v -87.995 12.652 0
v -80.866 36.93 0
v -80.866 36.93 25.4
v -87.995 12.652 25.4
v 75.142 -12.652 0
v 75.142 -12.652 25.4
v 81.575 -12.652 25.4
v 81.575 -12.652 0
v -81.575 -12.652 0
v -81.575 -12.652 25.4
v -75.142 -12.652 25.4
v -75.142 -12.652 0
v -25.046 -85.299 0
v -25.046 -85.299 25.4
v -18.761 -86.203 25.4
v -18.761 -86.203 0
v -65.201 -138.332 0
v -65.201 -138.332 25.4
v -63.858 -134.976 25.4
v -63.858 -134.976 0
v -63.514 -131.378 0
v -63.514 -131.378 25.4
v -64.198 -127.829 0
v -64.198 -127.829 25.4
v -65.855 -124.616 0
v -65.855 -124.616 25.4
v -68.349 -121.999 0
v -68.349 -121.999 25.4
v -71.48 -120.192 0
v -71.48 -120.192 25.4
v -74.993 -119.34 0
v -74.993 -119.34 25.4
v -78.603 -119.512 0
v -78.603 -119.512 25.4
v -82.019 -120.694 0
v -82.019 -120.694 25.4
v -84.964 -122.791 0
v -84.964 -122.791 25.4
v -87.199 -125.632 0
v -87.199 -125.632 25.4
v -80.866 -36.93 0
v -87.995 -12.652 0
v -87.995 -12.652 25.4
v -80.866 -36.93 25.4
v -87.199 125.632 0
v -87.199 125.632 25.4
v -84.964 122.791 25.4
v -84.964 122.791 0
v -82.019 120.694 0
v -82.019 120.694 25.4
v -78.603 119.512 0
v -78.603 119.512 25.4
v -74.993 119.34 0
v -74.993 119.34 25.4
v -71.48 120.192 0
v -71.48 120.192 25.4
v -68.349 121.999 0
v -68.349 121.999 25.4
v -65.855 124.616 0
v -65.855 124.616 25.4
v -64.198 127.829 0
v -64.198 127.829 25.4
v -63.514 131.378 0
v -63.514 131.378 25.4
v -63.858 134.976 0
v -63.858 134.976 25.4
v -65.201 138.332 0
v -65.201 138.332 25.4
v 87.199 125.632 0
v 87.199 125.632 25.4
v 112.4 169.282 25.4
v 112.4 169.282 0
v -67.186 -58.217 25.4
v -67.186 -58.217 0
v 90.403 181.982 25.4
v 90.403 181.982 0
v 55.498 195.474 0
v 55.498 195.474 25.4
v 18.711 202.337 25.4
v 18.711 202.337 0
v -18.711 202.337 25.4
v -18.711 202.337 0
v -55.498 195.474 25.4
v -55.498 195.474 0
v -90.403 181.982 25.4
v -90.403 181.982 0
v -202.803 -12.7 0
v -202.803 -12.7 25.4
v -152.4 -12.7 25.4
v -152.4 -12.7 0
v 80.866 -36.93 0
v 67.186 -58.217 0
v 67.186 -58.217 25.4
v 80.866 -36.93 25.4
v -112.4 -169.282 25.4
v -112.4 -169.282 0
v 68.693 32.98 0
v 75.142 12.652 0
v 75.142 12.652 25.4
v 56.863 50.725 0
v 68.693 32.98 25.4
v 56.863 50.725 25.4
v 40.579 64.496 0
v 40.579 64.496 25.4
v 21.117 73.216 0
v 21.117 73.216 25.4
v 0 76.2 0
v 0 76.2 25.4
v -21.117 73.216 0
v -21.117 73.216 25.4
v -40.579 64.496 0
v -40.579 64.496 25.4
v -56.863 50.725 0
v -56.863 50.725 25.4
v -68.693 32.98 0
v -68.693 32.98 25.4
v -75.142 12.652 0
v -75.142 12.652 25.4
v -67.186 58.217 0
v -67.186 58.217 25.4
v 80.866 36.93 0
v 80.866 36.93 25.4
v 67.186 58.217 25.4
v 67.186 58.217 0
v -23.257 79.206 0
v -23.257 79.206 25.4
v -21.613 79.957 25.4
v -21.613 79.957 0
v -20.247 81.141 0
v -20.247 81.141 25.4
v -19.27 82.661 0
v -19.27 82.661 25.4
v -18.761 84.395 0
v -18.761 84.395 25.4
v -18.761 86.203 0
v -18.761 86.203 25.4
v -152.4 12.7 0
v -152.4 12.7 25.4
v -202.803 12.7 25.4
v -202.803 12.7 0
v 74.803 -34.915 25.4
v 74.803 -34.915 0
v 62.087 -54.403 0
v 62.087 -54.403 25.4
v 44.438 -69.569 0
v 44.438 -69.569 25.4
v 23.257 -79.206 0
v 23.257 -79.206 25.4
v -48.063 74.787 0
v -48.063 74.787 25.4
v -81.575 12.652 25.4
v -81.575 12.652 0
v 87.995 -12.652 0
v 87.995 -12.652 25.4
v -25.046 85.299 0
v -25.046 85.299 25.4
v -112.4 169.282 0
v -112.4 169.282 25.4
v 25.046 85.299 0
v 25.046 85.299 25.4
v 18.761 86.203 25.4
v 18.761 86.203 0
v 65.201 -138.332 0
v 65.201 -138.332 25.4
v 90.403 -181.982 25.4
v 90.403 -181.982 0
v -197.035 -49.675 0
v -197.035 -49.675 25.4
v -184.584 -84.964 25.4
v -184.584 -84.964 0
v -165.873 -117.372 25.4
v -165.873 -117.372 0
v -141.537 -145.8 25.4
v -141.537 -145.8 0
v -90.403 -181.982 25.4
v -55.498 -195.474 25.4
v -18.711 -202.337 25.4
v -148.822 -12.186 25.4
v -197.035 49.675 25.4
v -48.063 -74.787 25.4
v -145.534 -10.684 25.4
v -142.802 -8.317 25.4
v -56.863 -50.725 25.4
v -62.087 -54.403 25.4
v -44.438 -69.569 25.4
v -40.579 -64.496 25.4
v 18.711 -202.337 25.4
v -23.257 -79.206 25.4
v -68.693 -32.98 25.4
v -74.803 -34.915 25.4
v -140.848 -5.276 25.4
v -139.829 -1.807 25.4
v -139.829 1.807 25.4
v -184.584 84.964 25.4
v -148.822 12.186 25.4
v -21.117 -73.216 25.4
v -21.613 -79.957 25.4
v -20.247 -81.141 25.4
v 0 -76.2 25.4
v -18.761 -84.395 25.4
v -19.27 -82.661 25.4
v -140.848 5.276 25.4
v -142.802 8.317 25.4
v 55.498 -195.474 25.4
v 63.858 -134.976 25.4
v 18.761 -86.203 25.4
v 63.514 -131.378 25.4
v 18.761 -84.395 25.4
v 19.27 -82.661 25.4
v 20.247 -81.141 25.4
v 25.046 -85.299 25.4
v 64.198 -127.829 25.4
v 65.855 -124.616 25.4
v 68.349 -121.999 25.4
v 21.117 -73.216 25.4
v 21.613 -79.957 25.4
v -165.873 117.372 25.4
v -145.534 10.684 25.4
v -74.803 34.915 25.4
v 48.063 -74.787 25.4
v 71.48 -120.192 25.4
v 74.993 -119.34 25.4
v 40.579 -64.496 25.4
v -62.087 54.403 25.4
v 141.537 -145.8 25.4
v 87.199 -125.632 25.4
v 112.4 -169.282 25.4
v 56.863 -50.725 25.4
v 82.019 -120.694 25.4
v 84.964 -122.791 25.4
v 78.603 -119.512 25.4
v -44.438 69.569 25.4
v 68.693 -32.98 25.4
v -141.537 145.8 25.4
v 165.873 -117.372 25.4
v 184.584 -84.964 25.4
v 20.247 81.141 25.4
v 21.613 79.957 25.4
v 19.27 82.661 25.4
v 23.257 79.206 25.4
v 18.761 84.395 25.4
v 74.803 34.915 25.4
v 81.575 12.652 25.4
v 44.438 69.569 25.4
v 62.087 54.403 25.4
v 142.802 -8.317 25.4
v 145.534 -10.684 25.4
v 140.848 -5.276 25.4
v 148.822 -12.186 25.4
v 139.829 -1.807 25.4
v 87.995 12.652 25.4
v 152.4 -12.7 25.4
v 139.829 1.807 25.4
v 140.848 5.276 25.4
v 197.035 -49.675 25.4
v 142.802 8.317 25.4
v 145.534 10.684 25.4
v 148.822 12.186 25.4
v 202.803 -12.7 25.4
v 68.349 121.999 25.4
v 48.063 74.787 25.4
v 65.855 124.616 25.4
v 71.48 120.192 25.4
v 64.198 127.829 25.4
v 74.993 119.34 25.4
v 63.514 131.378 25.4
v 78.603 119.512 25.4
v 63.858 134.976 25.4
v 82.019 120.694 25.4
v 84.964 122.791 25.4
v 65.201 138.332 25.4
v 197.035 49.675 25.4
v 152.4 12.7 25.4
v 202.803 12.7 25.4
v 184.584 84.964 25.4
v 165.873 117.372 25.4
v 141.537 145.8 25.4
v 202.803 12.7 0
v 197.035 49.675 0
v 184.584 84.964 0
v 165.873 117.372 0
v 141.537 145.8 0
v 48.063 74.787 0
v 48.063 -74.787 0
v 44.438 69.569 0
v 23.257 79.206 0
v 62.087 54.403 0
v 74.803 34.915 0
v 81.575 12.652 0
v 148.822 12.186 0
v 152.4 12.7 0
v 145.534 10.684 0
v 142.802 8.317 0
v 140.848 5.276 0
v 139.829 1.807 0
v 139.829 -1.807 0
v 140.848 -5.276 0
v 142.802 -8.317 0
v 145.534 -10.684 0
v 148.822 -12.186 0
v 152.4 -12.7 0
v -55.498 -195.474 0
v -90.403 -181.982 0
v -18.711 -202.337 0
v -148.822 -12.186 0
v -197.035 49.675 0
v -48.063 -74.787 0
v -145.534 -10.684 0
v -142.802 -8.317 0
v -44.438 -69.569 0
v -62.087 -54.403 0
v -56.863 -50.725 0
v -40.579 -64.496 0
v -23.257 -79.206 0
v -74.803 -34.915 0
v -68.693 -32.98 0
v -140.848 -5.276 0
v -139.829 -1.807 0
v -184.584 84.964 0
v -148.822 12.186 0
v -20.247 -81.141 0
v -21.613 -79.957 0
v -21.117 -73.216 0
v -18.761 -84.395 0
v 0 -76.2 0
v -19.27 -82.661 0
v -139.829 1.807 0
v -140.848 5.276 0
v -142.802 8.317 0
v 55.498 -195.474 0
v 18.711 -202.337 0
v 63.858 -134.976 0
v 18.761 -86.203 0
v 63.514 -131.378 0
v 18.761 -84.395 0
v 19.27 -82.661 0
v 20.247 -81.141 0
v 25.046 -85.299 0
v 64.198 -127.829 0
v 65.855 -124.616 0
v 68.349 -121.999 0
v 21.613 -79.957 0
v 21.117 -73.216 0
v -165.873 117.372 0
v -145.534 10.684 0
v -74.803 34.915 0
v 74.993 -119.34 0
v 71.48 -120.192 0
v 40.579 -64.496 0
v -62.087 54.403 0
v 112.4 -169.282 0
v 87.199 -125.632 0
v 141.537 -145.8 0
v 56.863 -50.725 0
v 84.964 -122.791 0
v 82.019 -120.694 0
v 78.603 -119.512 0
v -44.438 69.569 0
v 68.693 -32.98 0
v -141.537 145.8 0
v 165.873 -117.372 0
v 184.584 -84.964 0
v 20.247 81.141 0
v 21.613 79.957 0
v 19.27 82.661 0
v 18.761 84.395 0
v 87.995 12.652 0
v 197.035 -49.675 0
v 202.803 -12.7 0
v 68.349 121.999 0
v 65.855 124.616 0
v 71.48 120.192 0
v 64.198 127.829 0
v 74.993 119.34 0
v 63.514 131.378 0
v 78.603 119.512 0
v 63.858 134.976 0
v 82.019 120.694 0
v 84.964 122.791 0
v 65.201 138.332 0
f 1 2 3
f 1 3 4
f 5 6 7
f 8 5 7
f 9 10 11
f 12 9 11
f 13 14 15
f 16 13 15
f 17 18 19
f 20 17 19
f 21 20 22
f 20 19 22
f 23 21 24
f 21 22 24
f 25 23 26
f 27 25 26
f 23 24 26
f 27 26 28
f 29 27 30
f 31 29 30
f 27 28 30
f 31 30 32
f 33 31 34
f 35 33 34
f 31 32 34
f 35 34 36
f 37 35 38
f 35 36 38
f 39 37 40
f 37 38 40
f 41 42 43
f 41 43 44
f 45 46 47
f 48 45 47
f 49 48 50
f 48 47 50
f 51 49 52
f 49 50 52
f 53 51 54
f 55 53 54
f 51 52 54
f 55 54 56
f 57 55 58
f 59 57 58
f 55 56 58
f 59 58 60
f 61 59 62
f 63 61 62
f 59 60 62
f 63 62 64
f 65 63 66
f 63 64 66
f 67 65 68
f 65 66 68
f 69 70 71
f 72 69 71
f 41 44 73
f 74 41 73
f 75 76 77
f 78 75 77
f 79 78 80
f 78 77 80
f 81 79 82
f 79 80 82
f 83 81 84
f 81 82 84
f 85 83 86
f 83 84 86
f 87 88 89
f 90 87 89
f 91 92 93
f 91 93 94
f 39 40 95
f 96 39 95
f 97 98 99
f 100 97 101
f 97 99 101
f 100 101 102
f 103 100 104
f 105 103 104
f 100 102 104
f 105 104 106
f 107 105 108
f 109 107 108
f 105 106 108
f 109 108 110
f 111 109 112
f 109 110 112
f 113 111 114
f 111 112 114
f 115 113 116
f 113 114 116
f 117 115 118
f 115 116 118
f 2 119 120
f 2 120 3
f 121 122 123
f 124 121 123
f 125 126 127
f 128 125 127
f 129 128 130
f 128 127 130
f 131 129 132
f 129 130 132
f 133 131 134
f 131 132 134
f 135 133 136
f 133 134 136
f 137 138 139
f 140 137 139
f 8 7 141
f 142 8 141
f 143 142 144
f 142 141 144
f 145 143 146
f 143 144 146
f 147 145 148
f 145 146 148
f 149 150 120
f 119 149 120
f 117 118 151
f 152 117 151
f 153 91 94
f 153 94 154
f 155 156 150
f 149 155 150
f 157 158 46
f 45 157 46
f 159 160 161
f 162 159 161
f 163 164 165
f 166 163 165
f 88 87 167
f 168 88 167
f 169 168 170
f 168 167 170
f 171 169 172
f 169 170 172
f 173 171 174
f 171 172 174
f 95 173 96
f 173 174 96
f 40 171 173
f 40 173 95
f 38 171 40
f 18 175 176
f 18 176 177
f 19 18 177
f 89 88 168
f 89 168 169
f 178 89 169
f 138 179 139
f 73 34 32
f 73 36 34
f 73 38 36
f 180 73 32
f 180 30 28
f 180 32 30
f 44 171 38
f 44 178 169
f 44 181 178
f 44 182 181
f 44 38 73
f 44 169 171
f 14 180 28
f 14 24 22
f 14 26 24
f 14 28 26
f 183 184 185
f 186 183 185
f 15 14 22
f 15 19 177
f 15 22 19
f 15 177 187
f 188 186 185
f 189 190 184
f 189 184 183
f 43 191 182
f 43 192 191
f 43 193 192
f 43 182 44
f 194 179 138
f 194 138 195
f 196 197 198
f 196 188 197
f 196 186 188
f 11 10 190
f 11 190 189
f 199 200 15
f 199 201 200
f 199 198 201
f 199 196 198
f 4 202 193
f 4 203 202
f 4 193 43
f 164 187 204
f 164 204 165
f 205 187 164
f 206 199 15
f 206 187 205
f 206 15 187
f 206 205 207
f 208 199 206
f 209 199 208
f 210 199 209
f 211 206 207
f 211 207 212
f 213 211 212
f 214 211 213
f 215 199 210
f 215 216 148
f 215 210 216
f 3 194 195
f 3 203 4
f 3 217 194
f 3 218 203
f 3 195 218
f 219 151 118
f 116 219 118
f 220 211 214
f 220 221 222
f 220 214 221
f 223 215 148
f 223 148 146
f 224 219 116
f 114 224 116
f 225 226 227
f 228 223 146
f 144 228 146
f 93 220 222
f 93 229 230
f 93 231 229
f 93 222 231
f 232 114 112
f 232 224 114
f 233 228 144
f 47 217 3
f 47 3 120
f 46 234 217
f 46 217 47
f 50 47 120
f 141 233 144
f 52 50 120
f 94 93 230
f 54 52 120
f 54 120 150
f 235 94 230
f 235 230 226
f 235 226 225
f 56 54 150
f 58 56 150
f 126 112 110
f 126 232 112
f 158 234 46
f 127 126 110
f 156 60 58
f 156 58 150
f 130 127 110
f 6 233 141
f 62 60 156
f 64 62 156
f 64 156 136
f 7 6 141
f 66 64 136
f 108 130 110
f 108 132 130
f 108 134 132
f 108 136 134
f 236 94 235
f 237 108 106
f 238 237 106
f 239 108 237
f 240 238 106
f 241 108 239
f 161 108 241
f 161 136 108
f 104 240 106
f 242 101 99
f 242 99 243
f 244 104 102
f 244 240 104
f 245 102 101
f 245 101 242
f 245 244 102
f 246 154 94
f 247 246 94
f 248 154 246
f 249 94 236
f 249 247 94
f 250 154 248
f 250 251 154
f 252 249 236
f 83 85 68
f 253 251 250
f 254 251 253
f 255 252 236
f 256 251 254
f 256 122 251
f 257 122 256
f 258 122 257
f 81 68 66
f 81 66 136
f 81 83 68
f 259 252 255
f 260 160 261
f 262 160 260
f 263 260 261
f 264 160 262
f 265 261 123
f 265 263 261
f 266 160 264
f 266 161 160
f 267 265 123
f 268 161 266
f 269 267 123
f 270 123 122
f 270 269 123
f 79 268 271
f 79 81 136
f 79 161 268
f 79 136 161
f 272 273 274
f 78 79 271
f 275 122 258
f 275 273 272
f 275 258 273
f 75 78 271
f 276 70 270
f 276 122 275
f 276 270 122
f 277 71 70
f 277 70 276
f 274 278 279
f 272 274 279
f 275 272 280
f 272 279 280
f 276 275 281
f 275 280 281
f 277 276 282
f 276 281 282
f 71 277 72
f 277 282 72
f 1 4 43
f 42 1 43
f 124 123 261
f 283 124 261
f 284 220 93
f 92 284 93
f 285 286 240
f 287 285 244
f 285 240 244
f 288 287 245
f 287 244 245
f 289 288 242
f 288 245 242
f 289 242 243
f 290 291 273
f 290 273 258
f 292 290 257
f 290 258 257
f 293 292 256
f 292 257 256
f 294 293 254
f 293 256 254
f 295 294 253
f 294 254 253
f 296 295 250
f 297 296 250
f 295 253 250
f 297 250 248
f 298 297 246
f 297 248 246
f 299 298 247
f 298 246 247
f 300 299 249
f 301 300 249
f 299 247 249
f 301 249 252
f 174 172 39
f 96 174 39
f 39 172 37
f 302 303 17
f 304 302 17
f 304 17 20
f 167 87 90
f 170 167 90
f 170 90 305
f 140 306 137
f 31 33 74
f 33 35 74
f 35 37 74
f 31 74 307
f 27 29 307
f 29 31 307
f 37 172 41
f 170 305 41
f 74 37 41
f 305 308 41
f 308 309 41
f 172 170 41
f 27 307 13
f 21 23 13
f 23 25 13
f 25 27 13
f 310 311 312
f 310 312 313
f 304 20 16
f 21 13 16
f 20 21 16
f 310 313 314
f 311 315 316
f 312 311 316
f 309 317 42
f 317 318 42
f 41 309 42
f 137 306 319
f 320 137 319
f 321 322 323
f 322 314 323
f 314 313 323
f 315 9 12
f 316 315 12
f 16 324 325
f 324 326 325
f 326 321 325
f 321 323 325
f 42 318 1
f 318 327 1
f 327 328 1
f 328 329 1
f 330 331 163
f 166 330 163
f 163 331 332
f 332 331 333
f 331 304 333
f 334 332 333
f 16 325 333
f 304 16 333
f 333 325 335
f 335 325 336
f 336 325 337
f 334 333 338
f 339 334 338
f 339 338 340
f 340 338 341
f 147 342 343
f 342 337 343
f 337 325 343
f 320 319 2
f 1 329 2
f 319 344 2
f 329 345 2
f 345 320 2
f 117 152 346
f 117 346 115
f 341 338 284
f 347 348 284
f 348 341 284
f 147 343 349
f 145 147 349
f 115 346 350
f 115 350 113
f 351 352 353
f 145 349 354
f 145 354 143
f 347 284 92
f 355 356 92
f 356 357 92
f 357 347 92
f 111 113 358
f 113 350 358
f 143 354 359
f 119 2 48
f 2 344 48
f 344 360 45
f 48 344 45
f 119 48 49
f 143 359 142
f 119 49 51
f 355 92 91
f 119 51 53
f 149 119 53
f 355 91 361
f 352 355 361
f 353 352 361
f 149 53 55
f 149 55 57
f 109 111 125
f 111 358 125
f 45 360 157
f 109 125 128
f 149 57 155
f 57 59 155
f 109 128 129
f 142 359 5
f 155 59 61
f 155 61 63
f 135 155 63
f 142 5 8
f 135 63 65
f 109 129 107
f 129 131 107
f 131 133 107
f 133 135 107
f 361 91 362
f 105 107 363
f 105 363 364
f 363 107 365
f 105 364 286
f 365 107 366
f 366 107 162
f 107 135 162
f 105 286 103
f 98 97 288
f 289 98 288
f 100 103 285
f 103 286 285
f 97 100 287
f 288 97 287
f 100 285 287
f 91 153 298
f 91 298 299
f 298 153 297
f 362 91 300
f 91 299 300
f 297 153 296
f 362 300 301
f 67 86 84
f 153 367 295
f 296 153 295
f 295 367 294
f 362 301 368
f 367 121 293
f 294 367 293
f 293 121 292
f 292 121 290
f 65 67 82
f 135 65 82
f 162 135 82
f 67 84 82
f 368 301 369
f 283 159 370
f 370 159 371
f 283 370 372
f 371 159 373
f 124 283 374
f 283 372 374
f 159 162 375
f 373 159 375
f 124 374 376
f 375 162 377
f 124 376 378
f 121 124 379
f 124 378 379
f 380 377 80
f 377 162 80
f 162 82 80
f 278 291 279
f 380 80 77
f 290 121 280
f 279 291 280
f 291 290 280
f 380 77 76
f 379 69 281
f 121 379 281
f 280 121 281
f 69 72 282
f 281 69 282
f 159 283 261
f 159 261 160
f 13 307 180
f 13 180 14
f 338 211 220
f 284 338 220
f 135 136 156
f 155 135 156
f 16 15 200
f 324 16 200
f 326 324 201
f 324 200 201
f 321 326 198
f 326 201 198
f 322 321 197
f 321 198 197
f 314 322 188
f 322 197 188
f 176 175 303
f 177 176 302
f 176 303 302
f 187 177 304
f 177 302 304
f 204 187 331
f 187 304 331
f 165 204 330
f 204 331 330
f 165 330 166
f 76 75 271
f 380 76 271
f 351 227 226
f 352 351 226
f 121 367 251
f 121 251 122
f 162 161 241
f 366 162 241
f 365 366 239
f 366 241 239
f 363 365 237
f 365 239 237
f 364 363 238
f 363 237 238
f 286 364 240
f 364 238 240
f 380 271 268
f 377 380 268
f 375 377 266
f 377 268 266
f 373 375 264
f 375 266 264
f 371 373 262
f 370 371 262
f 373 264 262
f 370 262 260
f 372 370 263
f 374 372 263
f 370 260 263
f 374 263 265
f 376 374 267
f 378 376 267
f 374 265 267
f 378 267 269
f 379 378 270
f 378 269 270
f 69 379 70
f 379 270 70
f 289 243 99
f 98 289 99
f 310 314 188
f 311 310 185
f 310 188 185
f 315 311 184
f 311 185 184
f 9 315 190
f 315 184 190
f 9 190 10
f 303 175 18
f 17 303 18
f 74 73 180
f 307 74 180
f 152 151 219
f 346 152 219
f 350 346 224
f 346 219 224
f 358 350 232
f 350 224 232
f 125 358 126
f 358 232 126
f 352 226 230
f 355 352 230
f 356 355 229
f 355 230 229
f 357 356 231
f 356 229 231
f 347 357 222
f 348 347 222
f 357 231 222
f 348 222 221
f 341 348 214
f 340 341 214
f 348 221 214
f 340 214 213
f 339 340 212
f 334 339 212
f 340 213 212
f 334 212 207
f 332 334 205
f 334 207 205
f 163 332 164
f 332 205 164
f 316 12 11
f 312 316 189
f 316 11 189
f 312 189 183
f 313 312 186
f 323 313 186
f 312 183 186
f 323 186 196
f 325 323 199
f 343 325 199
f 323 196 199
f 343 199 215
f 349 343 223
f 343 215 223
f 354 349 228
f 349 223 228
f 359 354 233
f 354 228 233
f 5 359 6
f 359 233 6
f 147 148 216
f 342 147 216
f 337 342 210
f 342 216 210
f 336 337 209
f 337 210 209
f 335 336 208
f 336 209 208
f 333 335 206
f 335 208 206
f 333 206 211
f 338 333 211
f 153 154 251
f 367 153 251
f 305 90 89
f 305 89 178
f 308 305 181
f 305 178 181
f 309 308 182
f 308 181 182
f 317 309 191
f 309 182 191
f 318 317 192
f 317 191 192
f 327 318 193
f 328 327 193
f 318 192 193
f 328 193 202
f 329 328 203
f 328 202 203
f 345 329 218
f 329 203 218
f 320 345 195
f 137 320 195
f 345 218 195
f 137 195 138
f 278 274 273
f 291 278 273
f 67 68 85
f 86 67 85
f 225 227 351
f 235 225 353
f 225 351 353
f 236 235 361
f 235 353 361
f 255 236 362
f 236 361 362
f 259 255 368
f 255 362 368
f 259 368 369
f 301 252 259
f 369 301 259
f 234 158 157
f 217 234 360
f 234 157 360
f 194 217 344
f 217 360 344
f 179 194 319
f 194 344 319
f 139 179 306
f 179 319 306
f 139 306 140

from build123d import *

# Parameters (mm, degrees)
F0_R     = 203.2
F1_DEPTH = 25.4
F3_DEPTH = 25.401
F5_DEPTH = 25.401


with BuildPart() as f1:
    # F0 (on Top) → F1 (new body)
    with BuildSketch(Plane.XY):
        Circle(F0_R)
    extrude(amount=F1_DEPTH)

    # F2 (on face) → F3 (cut, through all)
    with BuildSketch(Plane.XY.offset(25.4)):
        with BuildLine():
            ThreePointArc((-203.2, 12.7), (-215.9, 0), (-203.2, -12.7))
            Line((-203.2, -12.7), (-152.4, -12.7))
            ThreePointArc((-152.4, -12.7), (-139.7, 0), (-152.4, 12.7))
            Line((-152.4, 12.7), (-203.2, 12.7))
        make_face()
        with BuildLine():
            Line((-87.1985226281, -125.6322715367), (-112.399890962, -169.2823219114))
            ThreePointArc((-112.399890962, -169.2823219114), (-101.6, -175.976362049), (-90.4028457059, -181.9823219114))
            Line((-90.4028457059, -181.9823219114), (-65.2014773719, -138.3322715367))
            ThreePointArc((-65.2014773719, -138.3322715367), (-69.85, -120.9837489087), (-87.1985226281, -125.6322715367))
        make_face()
        with BuildLine():
            Line((65.2014773719, -138.3322715367), (90.4028457059, -181.9823219114))
            ThreePointArc((90.4028457059, -181.9823219114), (101.6, -175.976362049), (112.399890962, -169.2823219114))
            Line((112.399890962, -169.2823219114), (87.1985226281, -125.6322715367))
            ThreePointArc((87.1985226281, -125.6322715367), (69.85, -120.9837489087), (65.2014773719, -138.3322715367))
        make_face()
        with BuildLine():
            Line((152.4, -12.7), (202.8027366679, -12.7))
            ThreePointArc((202.8027366679, -12.7), (203.1006598844, -6.353105897), (203.2, 0))
            ThreePointArc((203.2, 0), (203.1006598844, 6.353105897), (202.8027366679, 12.7))
            Line((202.8027366679, 12.7), (152.4, 12.7))
            ThreePointArc((152.4, 12.7), (139.7, 0), (152.4, -12.7))
        make_face()
        with BuildLine():
            ThreePointArc((112.399890962, 169.2823219114), (101.6, 175.976362049), (90.4028457059, 181.9823219114))
            Line((90.4028457059, 181.9823219114), (65.2014773719, 138.3322715367))
            ThreePointArc((65.2014773719, 138.3322715367), (69.85, 120.9837489087), (87.1985226281, 125.6322715367))
            Line((87.1985226281, 125.6322715367), (112.399890962, 169.2823219114))
        make_face()
        with BuildLine():
            ThreePointArc((-90.4028457059, 181.9823219114), (-101.6, 175.976362049), (-112.399890962, 169.2823219114))
            Line((-112.399890962, 169.2823219114), (-87.1985226281, 125.6322715367))
            ThreePointArc((-87.1985226281, 125.6322715367), (-69.85, 120.9837489087), (-65.2014773719, 138.3322715367))
            Line((-65.2014773719, 138.3322715367), (-90.4028457059, 181.9823219114))
        make_face()
    extrude(amount=-F3_DEPTH, mode=Mode.SUBTRACT)

    # F4 (on face) → F5 (cut, through all)
    with BuildSketch(Plane.XY.offset(25.4)):
        with BuildLine():
            ThreePointArc((76.2, 0), (75.9351262608, 6.3479602827), (75.1423464632, 12.6517891225))
            ThreePointArc((75.1423464632, 12.6517891225), (0, 76.2), (-75.1423464632, 12.6517891225))
            ThreePointArc((-75.1423464632, 12.6517891225), (-76.2, 0), (-75.1423464632, -12.6517891225))
            ThreePointArc((-75.1423464632, -12.6517891225), (0, -76.2), (75.1423464632, -12.6517891225))
            ThreePointArc((75.1423464632, -12.6517891225), (75.9351262608, -6.3479602827), (76.2, 0))
        make_face()
        with BuildLine():
            Line((-87.9951261832, 12.6517891225), (-81.5747187062, 12.6517891225))
            ThreePointArc((-81.5747187062, 12.6517891225), (-62.0869878899, 54.4032024311), (-23.2570225673, 79.2061449719))
            ThreePointArc((-23.2570225673, 79.2061449719), (-19.7040643697, 81.8658561635), (-18.7606581473, 86.2026245774))
            Line((-18.7606581473, 86.2026245774), (-25.0460243032, 85.2989253543))
            Line((-25.0460243032, 85.2989253543), (-48.0629686718, 74.7874390687))
            Line((-48.0629686718, 74.7874390687), (-67.1861371601, 58.2171192477))
            Line((-67.1861371601, 58.2171192477), (-80.866284387, 36.9303946559))
            Line((-80.866284387, 36.9303946559), (-87.9951261832, 12.6517891225))
        make_face()
        with BuildLine():
            ThreePointArc((-81.5747187062, -12.6517891225), (-82.55, 0), (-81.5747187062, 12.6517891225))
            Line((-81.5747187062, 12.6517891225), (-87.9951261832, 12.6517891225))
            Line((-87.9951261832, 12.6517891225), (-87.9951261832, -12.6517891225))
            Line((-87.9951261832, -12.6517891225), (-81.5747187062, -12.6517891225))
        make_face()
        with BuildLine():
            ThreePointArc((-75.1423464632, -12.6517891225), (-76.2, 0), (-75.1423464632, 12.6517891225))
            Line((-75.1423464632, 12.6517891225), (-81.5747187062, 12.6517891225))
            ThreePointArc((-81.5747187062, 12.6517891225), (-82.55, 0), (-81.5747187062, -12.6517891225))
            Line((-81.5747187062, -12.6517891225), (-75.1423464632, -12.6517891225))
        make_face()
        with BuildLine():
            ThreePointArc((-23.2570225673, -79.2061449719), (-62.0869878899, -54.4032024311), (-81.5747187062, -12.6517891225))
            Line((-81.5747187062, -12.6517891225), (-87.9951261832, -12.6517891225))
            Line((-87.9951261832, -12.6517891225), (-80.866284387, -36.9303946559))
            Line((-80.866284387, -36.9303946559), (-67.1861371601, -58.2171192477))
            Line((-67.1861371601, -58.2171192477), (-48.0629686718, -74.7874390687))
            Line((-48.0629686718, -74.7874390687), (-25.0460243032, -85.2989253543))
            Line((-25.0460243032, -85.2989253543), (-18.7606581473, -86.2026245774))
            ThreePointArc((-18.7606581473, -86.2026245774), (-19.7040643697, -81.8658561635), (-23.2570225673, -79.2061449719))
        make_face()
        with BuildLine():
            Line((80.866284387, -36.9303946559), (87.9951261832, -12.6517891225))
            Line((87.9951261832, -12.6517891225), (81.5747187062, -12.6517891225))
            ThreePointArc((81.5747187062, -12.6517891225), (62.0869878899, -54.4032024311), (23.2570225673, -79.2061449719))
            ThreePointArc((23.2570225673, -79.2061449719), (19.7040643697, -81.8658561635), (18.7606581473, -86.2026245774))
            Line((18.7606581473, -86.2026245774), (25.0460243032, -85.2989253543))
            Line((25.0460243032, -85.2989253543), (48.0629686718, -74.7874390687))
            Line((48.0629686718, -74.7874390687), (67.1861371601, -58.2171192477))
            Line((67.1861371601, -58.2171192477), (80.866284387, -36.9303946559))
        make_face()
        with BuildLine():
            Line((87.9951261832, -12.6517891225), (87.9951261832, 12.6517891225))
            Line((87.9951261832, 12.6517891225), (81.5747187062, 12.6517891225))
            ThreePointArc((81.5747187062, 12.6517891225), (82.55, 0), (81.5747187062, -12.6517891225))
            Line((81.5747187062, -12.6517891225), (87.9951261832, -12.6517891225))
        make_face()
        with BuildLine():
            ThreePointArc((81.5747187062, -12.6517891225), (82.55, 0), (81.5747187062, 12.6517891225))
            Line((81.5747187062, 12.6517891225), (75.1423464632, 12.6517891225))
            ThreePointArc((75.1423464632, 12.6517891225), (75.9351262608, 6.3479602827), (76.2, 0))
            ThreePointArc((76.2, 0), (75.9351262608, -6.3479602827), (75.1423464632, -12.6517891225))
            Line((75.1423464632, -12.6517891225), (81.5747187062, -12.6517891225))
        make_face()
        with BuildLine():
            Line((81.5747187062, 12.6517891225), (87.9951261832, 12.6517891225))
            Line((87.9951261832, 12.6517891225), (80.866284387, 36.9303946559))
            Line((80.866284387, 36.9303946559), (67.1861371601, 58.2171192477))
            Line((67.1861371601, 58.2171192477), (48.0629686718, 74.7874390687))
            Line((48.0629686718, 74.7874390687), (25.0460243032, 85.2989253543))
            Line((25.0460243032, 85.2989253543), (18.7606581473, 86.2026245774))
            ThreePointArc((18.7606581473, 86.2026245774), (19.7040643697, 81.8658561635), (23.2570225673, 79.2061449719))
            ThreePointArc((23.2570225673, 79.2061449719), (62.0869878899, 54.4032024311), (81.5747187062, 12.6517891225))
        make_face()
    extrude(amount=-F5_DEPTH, mode=Mode.SUBTRACT)


solid = f1.part
